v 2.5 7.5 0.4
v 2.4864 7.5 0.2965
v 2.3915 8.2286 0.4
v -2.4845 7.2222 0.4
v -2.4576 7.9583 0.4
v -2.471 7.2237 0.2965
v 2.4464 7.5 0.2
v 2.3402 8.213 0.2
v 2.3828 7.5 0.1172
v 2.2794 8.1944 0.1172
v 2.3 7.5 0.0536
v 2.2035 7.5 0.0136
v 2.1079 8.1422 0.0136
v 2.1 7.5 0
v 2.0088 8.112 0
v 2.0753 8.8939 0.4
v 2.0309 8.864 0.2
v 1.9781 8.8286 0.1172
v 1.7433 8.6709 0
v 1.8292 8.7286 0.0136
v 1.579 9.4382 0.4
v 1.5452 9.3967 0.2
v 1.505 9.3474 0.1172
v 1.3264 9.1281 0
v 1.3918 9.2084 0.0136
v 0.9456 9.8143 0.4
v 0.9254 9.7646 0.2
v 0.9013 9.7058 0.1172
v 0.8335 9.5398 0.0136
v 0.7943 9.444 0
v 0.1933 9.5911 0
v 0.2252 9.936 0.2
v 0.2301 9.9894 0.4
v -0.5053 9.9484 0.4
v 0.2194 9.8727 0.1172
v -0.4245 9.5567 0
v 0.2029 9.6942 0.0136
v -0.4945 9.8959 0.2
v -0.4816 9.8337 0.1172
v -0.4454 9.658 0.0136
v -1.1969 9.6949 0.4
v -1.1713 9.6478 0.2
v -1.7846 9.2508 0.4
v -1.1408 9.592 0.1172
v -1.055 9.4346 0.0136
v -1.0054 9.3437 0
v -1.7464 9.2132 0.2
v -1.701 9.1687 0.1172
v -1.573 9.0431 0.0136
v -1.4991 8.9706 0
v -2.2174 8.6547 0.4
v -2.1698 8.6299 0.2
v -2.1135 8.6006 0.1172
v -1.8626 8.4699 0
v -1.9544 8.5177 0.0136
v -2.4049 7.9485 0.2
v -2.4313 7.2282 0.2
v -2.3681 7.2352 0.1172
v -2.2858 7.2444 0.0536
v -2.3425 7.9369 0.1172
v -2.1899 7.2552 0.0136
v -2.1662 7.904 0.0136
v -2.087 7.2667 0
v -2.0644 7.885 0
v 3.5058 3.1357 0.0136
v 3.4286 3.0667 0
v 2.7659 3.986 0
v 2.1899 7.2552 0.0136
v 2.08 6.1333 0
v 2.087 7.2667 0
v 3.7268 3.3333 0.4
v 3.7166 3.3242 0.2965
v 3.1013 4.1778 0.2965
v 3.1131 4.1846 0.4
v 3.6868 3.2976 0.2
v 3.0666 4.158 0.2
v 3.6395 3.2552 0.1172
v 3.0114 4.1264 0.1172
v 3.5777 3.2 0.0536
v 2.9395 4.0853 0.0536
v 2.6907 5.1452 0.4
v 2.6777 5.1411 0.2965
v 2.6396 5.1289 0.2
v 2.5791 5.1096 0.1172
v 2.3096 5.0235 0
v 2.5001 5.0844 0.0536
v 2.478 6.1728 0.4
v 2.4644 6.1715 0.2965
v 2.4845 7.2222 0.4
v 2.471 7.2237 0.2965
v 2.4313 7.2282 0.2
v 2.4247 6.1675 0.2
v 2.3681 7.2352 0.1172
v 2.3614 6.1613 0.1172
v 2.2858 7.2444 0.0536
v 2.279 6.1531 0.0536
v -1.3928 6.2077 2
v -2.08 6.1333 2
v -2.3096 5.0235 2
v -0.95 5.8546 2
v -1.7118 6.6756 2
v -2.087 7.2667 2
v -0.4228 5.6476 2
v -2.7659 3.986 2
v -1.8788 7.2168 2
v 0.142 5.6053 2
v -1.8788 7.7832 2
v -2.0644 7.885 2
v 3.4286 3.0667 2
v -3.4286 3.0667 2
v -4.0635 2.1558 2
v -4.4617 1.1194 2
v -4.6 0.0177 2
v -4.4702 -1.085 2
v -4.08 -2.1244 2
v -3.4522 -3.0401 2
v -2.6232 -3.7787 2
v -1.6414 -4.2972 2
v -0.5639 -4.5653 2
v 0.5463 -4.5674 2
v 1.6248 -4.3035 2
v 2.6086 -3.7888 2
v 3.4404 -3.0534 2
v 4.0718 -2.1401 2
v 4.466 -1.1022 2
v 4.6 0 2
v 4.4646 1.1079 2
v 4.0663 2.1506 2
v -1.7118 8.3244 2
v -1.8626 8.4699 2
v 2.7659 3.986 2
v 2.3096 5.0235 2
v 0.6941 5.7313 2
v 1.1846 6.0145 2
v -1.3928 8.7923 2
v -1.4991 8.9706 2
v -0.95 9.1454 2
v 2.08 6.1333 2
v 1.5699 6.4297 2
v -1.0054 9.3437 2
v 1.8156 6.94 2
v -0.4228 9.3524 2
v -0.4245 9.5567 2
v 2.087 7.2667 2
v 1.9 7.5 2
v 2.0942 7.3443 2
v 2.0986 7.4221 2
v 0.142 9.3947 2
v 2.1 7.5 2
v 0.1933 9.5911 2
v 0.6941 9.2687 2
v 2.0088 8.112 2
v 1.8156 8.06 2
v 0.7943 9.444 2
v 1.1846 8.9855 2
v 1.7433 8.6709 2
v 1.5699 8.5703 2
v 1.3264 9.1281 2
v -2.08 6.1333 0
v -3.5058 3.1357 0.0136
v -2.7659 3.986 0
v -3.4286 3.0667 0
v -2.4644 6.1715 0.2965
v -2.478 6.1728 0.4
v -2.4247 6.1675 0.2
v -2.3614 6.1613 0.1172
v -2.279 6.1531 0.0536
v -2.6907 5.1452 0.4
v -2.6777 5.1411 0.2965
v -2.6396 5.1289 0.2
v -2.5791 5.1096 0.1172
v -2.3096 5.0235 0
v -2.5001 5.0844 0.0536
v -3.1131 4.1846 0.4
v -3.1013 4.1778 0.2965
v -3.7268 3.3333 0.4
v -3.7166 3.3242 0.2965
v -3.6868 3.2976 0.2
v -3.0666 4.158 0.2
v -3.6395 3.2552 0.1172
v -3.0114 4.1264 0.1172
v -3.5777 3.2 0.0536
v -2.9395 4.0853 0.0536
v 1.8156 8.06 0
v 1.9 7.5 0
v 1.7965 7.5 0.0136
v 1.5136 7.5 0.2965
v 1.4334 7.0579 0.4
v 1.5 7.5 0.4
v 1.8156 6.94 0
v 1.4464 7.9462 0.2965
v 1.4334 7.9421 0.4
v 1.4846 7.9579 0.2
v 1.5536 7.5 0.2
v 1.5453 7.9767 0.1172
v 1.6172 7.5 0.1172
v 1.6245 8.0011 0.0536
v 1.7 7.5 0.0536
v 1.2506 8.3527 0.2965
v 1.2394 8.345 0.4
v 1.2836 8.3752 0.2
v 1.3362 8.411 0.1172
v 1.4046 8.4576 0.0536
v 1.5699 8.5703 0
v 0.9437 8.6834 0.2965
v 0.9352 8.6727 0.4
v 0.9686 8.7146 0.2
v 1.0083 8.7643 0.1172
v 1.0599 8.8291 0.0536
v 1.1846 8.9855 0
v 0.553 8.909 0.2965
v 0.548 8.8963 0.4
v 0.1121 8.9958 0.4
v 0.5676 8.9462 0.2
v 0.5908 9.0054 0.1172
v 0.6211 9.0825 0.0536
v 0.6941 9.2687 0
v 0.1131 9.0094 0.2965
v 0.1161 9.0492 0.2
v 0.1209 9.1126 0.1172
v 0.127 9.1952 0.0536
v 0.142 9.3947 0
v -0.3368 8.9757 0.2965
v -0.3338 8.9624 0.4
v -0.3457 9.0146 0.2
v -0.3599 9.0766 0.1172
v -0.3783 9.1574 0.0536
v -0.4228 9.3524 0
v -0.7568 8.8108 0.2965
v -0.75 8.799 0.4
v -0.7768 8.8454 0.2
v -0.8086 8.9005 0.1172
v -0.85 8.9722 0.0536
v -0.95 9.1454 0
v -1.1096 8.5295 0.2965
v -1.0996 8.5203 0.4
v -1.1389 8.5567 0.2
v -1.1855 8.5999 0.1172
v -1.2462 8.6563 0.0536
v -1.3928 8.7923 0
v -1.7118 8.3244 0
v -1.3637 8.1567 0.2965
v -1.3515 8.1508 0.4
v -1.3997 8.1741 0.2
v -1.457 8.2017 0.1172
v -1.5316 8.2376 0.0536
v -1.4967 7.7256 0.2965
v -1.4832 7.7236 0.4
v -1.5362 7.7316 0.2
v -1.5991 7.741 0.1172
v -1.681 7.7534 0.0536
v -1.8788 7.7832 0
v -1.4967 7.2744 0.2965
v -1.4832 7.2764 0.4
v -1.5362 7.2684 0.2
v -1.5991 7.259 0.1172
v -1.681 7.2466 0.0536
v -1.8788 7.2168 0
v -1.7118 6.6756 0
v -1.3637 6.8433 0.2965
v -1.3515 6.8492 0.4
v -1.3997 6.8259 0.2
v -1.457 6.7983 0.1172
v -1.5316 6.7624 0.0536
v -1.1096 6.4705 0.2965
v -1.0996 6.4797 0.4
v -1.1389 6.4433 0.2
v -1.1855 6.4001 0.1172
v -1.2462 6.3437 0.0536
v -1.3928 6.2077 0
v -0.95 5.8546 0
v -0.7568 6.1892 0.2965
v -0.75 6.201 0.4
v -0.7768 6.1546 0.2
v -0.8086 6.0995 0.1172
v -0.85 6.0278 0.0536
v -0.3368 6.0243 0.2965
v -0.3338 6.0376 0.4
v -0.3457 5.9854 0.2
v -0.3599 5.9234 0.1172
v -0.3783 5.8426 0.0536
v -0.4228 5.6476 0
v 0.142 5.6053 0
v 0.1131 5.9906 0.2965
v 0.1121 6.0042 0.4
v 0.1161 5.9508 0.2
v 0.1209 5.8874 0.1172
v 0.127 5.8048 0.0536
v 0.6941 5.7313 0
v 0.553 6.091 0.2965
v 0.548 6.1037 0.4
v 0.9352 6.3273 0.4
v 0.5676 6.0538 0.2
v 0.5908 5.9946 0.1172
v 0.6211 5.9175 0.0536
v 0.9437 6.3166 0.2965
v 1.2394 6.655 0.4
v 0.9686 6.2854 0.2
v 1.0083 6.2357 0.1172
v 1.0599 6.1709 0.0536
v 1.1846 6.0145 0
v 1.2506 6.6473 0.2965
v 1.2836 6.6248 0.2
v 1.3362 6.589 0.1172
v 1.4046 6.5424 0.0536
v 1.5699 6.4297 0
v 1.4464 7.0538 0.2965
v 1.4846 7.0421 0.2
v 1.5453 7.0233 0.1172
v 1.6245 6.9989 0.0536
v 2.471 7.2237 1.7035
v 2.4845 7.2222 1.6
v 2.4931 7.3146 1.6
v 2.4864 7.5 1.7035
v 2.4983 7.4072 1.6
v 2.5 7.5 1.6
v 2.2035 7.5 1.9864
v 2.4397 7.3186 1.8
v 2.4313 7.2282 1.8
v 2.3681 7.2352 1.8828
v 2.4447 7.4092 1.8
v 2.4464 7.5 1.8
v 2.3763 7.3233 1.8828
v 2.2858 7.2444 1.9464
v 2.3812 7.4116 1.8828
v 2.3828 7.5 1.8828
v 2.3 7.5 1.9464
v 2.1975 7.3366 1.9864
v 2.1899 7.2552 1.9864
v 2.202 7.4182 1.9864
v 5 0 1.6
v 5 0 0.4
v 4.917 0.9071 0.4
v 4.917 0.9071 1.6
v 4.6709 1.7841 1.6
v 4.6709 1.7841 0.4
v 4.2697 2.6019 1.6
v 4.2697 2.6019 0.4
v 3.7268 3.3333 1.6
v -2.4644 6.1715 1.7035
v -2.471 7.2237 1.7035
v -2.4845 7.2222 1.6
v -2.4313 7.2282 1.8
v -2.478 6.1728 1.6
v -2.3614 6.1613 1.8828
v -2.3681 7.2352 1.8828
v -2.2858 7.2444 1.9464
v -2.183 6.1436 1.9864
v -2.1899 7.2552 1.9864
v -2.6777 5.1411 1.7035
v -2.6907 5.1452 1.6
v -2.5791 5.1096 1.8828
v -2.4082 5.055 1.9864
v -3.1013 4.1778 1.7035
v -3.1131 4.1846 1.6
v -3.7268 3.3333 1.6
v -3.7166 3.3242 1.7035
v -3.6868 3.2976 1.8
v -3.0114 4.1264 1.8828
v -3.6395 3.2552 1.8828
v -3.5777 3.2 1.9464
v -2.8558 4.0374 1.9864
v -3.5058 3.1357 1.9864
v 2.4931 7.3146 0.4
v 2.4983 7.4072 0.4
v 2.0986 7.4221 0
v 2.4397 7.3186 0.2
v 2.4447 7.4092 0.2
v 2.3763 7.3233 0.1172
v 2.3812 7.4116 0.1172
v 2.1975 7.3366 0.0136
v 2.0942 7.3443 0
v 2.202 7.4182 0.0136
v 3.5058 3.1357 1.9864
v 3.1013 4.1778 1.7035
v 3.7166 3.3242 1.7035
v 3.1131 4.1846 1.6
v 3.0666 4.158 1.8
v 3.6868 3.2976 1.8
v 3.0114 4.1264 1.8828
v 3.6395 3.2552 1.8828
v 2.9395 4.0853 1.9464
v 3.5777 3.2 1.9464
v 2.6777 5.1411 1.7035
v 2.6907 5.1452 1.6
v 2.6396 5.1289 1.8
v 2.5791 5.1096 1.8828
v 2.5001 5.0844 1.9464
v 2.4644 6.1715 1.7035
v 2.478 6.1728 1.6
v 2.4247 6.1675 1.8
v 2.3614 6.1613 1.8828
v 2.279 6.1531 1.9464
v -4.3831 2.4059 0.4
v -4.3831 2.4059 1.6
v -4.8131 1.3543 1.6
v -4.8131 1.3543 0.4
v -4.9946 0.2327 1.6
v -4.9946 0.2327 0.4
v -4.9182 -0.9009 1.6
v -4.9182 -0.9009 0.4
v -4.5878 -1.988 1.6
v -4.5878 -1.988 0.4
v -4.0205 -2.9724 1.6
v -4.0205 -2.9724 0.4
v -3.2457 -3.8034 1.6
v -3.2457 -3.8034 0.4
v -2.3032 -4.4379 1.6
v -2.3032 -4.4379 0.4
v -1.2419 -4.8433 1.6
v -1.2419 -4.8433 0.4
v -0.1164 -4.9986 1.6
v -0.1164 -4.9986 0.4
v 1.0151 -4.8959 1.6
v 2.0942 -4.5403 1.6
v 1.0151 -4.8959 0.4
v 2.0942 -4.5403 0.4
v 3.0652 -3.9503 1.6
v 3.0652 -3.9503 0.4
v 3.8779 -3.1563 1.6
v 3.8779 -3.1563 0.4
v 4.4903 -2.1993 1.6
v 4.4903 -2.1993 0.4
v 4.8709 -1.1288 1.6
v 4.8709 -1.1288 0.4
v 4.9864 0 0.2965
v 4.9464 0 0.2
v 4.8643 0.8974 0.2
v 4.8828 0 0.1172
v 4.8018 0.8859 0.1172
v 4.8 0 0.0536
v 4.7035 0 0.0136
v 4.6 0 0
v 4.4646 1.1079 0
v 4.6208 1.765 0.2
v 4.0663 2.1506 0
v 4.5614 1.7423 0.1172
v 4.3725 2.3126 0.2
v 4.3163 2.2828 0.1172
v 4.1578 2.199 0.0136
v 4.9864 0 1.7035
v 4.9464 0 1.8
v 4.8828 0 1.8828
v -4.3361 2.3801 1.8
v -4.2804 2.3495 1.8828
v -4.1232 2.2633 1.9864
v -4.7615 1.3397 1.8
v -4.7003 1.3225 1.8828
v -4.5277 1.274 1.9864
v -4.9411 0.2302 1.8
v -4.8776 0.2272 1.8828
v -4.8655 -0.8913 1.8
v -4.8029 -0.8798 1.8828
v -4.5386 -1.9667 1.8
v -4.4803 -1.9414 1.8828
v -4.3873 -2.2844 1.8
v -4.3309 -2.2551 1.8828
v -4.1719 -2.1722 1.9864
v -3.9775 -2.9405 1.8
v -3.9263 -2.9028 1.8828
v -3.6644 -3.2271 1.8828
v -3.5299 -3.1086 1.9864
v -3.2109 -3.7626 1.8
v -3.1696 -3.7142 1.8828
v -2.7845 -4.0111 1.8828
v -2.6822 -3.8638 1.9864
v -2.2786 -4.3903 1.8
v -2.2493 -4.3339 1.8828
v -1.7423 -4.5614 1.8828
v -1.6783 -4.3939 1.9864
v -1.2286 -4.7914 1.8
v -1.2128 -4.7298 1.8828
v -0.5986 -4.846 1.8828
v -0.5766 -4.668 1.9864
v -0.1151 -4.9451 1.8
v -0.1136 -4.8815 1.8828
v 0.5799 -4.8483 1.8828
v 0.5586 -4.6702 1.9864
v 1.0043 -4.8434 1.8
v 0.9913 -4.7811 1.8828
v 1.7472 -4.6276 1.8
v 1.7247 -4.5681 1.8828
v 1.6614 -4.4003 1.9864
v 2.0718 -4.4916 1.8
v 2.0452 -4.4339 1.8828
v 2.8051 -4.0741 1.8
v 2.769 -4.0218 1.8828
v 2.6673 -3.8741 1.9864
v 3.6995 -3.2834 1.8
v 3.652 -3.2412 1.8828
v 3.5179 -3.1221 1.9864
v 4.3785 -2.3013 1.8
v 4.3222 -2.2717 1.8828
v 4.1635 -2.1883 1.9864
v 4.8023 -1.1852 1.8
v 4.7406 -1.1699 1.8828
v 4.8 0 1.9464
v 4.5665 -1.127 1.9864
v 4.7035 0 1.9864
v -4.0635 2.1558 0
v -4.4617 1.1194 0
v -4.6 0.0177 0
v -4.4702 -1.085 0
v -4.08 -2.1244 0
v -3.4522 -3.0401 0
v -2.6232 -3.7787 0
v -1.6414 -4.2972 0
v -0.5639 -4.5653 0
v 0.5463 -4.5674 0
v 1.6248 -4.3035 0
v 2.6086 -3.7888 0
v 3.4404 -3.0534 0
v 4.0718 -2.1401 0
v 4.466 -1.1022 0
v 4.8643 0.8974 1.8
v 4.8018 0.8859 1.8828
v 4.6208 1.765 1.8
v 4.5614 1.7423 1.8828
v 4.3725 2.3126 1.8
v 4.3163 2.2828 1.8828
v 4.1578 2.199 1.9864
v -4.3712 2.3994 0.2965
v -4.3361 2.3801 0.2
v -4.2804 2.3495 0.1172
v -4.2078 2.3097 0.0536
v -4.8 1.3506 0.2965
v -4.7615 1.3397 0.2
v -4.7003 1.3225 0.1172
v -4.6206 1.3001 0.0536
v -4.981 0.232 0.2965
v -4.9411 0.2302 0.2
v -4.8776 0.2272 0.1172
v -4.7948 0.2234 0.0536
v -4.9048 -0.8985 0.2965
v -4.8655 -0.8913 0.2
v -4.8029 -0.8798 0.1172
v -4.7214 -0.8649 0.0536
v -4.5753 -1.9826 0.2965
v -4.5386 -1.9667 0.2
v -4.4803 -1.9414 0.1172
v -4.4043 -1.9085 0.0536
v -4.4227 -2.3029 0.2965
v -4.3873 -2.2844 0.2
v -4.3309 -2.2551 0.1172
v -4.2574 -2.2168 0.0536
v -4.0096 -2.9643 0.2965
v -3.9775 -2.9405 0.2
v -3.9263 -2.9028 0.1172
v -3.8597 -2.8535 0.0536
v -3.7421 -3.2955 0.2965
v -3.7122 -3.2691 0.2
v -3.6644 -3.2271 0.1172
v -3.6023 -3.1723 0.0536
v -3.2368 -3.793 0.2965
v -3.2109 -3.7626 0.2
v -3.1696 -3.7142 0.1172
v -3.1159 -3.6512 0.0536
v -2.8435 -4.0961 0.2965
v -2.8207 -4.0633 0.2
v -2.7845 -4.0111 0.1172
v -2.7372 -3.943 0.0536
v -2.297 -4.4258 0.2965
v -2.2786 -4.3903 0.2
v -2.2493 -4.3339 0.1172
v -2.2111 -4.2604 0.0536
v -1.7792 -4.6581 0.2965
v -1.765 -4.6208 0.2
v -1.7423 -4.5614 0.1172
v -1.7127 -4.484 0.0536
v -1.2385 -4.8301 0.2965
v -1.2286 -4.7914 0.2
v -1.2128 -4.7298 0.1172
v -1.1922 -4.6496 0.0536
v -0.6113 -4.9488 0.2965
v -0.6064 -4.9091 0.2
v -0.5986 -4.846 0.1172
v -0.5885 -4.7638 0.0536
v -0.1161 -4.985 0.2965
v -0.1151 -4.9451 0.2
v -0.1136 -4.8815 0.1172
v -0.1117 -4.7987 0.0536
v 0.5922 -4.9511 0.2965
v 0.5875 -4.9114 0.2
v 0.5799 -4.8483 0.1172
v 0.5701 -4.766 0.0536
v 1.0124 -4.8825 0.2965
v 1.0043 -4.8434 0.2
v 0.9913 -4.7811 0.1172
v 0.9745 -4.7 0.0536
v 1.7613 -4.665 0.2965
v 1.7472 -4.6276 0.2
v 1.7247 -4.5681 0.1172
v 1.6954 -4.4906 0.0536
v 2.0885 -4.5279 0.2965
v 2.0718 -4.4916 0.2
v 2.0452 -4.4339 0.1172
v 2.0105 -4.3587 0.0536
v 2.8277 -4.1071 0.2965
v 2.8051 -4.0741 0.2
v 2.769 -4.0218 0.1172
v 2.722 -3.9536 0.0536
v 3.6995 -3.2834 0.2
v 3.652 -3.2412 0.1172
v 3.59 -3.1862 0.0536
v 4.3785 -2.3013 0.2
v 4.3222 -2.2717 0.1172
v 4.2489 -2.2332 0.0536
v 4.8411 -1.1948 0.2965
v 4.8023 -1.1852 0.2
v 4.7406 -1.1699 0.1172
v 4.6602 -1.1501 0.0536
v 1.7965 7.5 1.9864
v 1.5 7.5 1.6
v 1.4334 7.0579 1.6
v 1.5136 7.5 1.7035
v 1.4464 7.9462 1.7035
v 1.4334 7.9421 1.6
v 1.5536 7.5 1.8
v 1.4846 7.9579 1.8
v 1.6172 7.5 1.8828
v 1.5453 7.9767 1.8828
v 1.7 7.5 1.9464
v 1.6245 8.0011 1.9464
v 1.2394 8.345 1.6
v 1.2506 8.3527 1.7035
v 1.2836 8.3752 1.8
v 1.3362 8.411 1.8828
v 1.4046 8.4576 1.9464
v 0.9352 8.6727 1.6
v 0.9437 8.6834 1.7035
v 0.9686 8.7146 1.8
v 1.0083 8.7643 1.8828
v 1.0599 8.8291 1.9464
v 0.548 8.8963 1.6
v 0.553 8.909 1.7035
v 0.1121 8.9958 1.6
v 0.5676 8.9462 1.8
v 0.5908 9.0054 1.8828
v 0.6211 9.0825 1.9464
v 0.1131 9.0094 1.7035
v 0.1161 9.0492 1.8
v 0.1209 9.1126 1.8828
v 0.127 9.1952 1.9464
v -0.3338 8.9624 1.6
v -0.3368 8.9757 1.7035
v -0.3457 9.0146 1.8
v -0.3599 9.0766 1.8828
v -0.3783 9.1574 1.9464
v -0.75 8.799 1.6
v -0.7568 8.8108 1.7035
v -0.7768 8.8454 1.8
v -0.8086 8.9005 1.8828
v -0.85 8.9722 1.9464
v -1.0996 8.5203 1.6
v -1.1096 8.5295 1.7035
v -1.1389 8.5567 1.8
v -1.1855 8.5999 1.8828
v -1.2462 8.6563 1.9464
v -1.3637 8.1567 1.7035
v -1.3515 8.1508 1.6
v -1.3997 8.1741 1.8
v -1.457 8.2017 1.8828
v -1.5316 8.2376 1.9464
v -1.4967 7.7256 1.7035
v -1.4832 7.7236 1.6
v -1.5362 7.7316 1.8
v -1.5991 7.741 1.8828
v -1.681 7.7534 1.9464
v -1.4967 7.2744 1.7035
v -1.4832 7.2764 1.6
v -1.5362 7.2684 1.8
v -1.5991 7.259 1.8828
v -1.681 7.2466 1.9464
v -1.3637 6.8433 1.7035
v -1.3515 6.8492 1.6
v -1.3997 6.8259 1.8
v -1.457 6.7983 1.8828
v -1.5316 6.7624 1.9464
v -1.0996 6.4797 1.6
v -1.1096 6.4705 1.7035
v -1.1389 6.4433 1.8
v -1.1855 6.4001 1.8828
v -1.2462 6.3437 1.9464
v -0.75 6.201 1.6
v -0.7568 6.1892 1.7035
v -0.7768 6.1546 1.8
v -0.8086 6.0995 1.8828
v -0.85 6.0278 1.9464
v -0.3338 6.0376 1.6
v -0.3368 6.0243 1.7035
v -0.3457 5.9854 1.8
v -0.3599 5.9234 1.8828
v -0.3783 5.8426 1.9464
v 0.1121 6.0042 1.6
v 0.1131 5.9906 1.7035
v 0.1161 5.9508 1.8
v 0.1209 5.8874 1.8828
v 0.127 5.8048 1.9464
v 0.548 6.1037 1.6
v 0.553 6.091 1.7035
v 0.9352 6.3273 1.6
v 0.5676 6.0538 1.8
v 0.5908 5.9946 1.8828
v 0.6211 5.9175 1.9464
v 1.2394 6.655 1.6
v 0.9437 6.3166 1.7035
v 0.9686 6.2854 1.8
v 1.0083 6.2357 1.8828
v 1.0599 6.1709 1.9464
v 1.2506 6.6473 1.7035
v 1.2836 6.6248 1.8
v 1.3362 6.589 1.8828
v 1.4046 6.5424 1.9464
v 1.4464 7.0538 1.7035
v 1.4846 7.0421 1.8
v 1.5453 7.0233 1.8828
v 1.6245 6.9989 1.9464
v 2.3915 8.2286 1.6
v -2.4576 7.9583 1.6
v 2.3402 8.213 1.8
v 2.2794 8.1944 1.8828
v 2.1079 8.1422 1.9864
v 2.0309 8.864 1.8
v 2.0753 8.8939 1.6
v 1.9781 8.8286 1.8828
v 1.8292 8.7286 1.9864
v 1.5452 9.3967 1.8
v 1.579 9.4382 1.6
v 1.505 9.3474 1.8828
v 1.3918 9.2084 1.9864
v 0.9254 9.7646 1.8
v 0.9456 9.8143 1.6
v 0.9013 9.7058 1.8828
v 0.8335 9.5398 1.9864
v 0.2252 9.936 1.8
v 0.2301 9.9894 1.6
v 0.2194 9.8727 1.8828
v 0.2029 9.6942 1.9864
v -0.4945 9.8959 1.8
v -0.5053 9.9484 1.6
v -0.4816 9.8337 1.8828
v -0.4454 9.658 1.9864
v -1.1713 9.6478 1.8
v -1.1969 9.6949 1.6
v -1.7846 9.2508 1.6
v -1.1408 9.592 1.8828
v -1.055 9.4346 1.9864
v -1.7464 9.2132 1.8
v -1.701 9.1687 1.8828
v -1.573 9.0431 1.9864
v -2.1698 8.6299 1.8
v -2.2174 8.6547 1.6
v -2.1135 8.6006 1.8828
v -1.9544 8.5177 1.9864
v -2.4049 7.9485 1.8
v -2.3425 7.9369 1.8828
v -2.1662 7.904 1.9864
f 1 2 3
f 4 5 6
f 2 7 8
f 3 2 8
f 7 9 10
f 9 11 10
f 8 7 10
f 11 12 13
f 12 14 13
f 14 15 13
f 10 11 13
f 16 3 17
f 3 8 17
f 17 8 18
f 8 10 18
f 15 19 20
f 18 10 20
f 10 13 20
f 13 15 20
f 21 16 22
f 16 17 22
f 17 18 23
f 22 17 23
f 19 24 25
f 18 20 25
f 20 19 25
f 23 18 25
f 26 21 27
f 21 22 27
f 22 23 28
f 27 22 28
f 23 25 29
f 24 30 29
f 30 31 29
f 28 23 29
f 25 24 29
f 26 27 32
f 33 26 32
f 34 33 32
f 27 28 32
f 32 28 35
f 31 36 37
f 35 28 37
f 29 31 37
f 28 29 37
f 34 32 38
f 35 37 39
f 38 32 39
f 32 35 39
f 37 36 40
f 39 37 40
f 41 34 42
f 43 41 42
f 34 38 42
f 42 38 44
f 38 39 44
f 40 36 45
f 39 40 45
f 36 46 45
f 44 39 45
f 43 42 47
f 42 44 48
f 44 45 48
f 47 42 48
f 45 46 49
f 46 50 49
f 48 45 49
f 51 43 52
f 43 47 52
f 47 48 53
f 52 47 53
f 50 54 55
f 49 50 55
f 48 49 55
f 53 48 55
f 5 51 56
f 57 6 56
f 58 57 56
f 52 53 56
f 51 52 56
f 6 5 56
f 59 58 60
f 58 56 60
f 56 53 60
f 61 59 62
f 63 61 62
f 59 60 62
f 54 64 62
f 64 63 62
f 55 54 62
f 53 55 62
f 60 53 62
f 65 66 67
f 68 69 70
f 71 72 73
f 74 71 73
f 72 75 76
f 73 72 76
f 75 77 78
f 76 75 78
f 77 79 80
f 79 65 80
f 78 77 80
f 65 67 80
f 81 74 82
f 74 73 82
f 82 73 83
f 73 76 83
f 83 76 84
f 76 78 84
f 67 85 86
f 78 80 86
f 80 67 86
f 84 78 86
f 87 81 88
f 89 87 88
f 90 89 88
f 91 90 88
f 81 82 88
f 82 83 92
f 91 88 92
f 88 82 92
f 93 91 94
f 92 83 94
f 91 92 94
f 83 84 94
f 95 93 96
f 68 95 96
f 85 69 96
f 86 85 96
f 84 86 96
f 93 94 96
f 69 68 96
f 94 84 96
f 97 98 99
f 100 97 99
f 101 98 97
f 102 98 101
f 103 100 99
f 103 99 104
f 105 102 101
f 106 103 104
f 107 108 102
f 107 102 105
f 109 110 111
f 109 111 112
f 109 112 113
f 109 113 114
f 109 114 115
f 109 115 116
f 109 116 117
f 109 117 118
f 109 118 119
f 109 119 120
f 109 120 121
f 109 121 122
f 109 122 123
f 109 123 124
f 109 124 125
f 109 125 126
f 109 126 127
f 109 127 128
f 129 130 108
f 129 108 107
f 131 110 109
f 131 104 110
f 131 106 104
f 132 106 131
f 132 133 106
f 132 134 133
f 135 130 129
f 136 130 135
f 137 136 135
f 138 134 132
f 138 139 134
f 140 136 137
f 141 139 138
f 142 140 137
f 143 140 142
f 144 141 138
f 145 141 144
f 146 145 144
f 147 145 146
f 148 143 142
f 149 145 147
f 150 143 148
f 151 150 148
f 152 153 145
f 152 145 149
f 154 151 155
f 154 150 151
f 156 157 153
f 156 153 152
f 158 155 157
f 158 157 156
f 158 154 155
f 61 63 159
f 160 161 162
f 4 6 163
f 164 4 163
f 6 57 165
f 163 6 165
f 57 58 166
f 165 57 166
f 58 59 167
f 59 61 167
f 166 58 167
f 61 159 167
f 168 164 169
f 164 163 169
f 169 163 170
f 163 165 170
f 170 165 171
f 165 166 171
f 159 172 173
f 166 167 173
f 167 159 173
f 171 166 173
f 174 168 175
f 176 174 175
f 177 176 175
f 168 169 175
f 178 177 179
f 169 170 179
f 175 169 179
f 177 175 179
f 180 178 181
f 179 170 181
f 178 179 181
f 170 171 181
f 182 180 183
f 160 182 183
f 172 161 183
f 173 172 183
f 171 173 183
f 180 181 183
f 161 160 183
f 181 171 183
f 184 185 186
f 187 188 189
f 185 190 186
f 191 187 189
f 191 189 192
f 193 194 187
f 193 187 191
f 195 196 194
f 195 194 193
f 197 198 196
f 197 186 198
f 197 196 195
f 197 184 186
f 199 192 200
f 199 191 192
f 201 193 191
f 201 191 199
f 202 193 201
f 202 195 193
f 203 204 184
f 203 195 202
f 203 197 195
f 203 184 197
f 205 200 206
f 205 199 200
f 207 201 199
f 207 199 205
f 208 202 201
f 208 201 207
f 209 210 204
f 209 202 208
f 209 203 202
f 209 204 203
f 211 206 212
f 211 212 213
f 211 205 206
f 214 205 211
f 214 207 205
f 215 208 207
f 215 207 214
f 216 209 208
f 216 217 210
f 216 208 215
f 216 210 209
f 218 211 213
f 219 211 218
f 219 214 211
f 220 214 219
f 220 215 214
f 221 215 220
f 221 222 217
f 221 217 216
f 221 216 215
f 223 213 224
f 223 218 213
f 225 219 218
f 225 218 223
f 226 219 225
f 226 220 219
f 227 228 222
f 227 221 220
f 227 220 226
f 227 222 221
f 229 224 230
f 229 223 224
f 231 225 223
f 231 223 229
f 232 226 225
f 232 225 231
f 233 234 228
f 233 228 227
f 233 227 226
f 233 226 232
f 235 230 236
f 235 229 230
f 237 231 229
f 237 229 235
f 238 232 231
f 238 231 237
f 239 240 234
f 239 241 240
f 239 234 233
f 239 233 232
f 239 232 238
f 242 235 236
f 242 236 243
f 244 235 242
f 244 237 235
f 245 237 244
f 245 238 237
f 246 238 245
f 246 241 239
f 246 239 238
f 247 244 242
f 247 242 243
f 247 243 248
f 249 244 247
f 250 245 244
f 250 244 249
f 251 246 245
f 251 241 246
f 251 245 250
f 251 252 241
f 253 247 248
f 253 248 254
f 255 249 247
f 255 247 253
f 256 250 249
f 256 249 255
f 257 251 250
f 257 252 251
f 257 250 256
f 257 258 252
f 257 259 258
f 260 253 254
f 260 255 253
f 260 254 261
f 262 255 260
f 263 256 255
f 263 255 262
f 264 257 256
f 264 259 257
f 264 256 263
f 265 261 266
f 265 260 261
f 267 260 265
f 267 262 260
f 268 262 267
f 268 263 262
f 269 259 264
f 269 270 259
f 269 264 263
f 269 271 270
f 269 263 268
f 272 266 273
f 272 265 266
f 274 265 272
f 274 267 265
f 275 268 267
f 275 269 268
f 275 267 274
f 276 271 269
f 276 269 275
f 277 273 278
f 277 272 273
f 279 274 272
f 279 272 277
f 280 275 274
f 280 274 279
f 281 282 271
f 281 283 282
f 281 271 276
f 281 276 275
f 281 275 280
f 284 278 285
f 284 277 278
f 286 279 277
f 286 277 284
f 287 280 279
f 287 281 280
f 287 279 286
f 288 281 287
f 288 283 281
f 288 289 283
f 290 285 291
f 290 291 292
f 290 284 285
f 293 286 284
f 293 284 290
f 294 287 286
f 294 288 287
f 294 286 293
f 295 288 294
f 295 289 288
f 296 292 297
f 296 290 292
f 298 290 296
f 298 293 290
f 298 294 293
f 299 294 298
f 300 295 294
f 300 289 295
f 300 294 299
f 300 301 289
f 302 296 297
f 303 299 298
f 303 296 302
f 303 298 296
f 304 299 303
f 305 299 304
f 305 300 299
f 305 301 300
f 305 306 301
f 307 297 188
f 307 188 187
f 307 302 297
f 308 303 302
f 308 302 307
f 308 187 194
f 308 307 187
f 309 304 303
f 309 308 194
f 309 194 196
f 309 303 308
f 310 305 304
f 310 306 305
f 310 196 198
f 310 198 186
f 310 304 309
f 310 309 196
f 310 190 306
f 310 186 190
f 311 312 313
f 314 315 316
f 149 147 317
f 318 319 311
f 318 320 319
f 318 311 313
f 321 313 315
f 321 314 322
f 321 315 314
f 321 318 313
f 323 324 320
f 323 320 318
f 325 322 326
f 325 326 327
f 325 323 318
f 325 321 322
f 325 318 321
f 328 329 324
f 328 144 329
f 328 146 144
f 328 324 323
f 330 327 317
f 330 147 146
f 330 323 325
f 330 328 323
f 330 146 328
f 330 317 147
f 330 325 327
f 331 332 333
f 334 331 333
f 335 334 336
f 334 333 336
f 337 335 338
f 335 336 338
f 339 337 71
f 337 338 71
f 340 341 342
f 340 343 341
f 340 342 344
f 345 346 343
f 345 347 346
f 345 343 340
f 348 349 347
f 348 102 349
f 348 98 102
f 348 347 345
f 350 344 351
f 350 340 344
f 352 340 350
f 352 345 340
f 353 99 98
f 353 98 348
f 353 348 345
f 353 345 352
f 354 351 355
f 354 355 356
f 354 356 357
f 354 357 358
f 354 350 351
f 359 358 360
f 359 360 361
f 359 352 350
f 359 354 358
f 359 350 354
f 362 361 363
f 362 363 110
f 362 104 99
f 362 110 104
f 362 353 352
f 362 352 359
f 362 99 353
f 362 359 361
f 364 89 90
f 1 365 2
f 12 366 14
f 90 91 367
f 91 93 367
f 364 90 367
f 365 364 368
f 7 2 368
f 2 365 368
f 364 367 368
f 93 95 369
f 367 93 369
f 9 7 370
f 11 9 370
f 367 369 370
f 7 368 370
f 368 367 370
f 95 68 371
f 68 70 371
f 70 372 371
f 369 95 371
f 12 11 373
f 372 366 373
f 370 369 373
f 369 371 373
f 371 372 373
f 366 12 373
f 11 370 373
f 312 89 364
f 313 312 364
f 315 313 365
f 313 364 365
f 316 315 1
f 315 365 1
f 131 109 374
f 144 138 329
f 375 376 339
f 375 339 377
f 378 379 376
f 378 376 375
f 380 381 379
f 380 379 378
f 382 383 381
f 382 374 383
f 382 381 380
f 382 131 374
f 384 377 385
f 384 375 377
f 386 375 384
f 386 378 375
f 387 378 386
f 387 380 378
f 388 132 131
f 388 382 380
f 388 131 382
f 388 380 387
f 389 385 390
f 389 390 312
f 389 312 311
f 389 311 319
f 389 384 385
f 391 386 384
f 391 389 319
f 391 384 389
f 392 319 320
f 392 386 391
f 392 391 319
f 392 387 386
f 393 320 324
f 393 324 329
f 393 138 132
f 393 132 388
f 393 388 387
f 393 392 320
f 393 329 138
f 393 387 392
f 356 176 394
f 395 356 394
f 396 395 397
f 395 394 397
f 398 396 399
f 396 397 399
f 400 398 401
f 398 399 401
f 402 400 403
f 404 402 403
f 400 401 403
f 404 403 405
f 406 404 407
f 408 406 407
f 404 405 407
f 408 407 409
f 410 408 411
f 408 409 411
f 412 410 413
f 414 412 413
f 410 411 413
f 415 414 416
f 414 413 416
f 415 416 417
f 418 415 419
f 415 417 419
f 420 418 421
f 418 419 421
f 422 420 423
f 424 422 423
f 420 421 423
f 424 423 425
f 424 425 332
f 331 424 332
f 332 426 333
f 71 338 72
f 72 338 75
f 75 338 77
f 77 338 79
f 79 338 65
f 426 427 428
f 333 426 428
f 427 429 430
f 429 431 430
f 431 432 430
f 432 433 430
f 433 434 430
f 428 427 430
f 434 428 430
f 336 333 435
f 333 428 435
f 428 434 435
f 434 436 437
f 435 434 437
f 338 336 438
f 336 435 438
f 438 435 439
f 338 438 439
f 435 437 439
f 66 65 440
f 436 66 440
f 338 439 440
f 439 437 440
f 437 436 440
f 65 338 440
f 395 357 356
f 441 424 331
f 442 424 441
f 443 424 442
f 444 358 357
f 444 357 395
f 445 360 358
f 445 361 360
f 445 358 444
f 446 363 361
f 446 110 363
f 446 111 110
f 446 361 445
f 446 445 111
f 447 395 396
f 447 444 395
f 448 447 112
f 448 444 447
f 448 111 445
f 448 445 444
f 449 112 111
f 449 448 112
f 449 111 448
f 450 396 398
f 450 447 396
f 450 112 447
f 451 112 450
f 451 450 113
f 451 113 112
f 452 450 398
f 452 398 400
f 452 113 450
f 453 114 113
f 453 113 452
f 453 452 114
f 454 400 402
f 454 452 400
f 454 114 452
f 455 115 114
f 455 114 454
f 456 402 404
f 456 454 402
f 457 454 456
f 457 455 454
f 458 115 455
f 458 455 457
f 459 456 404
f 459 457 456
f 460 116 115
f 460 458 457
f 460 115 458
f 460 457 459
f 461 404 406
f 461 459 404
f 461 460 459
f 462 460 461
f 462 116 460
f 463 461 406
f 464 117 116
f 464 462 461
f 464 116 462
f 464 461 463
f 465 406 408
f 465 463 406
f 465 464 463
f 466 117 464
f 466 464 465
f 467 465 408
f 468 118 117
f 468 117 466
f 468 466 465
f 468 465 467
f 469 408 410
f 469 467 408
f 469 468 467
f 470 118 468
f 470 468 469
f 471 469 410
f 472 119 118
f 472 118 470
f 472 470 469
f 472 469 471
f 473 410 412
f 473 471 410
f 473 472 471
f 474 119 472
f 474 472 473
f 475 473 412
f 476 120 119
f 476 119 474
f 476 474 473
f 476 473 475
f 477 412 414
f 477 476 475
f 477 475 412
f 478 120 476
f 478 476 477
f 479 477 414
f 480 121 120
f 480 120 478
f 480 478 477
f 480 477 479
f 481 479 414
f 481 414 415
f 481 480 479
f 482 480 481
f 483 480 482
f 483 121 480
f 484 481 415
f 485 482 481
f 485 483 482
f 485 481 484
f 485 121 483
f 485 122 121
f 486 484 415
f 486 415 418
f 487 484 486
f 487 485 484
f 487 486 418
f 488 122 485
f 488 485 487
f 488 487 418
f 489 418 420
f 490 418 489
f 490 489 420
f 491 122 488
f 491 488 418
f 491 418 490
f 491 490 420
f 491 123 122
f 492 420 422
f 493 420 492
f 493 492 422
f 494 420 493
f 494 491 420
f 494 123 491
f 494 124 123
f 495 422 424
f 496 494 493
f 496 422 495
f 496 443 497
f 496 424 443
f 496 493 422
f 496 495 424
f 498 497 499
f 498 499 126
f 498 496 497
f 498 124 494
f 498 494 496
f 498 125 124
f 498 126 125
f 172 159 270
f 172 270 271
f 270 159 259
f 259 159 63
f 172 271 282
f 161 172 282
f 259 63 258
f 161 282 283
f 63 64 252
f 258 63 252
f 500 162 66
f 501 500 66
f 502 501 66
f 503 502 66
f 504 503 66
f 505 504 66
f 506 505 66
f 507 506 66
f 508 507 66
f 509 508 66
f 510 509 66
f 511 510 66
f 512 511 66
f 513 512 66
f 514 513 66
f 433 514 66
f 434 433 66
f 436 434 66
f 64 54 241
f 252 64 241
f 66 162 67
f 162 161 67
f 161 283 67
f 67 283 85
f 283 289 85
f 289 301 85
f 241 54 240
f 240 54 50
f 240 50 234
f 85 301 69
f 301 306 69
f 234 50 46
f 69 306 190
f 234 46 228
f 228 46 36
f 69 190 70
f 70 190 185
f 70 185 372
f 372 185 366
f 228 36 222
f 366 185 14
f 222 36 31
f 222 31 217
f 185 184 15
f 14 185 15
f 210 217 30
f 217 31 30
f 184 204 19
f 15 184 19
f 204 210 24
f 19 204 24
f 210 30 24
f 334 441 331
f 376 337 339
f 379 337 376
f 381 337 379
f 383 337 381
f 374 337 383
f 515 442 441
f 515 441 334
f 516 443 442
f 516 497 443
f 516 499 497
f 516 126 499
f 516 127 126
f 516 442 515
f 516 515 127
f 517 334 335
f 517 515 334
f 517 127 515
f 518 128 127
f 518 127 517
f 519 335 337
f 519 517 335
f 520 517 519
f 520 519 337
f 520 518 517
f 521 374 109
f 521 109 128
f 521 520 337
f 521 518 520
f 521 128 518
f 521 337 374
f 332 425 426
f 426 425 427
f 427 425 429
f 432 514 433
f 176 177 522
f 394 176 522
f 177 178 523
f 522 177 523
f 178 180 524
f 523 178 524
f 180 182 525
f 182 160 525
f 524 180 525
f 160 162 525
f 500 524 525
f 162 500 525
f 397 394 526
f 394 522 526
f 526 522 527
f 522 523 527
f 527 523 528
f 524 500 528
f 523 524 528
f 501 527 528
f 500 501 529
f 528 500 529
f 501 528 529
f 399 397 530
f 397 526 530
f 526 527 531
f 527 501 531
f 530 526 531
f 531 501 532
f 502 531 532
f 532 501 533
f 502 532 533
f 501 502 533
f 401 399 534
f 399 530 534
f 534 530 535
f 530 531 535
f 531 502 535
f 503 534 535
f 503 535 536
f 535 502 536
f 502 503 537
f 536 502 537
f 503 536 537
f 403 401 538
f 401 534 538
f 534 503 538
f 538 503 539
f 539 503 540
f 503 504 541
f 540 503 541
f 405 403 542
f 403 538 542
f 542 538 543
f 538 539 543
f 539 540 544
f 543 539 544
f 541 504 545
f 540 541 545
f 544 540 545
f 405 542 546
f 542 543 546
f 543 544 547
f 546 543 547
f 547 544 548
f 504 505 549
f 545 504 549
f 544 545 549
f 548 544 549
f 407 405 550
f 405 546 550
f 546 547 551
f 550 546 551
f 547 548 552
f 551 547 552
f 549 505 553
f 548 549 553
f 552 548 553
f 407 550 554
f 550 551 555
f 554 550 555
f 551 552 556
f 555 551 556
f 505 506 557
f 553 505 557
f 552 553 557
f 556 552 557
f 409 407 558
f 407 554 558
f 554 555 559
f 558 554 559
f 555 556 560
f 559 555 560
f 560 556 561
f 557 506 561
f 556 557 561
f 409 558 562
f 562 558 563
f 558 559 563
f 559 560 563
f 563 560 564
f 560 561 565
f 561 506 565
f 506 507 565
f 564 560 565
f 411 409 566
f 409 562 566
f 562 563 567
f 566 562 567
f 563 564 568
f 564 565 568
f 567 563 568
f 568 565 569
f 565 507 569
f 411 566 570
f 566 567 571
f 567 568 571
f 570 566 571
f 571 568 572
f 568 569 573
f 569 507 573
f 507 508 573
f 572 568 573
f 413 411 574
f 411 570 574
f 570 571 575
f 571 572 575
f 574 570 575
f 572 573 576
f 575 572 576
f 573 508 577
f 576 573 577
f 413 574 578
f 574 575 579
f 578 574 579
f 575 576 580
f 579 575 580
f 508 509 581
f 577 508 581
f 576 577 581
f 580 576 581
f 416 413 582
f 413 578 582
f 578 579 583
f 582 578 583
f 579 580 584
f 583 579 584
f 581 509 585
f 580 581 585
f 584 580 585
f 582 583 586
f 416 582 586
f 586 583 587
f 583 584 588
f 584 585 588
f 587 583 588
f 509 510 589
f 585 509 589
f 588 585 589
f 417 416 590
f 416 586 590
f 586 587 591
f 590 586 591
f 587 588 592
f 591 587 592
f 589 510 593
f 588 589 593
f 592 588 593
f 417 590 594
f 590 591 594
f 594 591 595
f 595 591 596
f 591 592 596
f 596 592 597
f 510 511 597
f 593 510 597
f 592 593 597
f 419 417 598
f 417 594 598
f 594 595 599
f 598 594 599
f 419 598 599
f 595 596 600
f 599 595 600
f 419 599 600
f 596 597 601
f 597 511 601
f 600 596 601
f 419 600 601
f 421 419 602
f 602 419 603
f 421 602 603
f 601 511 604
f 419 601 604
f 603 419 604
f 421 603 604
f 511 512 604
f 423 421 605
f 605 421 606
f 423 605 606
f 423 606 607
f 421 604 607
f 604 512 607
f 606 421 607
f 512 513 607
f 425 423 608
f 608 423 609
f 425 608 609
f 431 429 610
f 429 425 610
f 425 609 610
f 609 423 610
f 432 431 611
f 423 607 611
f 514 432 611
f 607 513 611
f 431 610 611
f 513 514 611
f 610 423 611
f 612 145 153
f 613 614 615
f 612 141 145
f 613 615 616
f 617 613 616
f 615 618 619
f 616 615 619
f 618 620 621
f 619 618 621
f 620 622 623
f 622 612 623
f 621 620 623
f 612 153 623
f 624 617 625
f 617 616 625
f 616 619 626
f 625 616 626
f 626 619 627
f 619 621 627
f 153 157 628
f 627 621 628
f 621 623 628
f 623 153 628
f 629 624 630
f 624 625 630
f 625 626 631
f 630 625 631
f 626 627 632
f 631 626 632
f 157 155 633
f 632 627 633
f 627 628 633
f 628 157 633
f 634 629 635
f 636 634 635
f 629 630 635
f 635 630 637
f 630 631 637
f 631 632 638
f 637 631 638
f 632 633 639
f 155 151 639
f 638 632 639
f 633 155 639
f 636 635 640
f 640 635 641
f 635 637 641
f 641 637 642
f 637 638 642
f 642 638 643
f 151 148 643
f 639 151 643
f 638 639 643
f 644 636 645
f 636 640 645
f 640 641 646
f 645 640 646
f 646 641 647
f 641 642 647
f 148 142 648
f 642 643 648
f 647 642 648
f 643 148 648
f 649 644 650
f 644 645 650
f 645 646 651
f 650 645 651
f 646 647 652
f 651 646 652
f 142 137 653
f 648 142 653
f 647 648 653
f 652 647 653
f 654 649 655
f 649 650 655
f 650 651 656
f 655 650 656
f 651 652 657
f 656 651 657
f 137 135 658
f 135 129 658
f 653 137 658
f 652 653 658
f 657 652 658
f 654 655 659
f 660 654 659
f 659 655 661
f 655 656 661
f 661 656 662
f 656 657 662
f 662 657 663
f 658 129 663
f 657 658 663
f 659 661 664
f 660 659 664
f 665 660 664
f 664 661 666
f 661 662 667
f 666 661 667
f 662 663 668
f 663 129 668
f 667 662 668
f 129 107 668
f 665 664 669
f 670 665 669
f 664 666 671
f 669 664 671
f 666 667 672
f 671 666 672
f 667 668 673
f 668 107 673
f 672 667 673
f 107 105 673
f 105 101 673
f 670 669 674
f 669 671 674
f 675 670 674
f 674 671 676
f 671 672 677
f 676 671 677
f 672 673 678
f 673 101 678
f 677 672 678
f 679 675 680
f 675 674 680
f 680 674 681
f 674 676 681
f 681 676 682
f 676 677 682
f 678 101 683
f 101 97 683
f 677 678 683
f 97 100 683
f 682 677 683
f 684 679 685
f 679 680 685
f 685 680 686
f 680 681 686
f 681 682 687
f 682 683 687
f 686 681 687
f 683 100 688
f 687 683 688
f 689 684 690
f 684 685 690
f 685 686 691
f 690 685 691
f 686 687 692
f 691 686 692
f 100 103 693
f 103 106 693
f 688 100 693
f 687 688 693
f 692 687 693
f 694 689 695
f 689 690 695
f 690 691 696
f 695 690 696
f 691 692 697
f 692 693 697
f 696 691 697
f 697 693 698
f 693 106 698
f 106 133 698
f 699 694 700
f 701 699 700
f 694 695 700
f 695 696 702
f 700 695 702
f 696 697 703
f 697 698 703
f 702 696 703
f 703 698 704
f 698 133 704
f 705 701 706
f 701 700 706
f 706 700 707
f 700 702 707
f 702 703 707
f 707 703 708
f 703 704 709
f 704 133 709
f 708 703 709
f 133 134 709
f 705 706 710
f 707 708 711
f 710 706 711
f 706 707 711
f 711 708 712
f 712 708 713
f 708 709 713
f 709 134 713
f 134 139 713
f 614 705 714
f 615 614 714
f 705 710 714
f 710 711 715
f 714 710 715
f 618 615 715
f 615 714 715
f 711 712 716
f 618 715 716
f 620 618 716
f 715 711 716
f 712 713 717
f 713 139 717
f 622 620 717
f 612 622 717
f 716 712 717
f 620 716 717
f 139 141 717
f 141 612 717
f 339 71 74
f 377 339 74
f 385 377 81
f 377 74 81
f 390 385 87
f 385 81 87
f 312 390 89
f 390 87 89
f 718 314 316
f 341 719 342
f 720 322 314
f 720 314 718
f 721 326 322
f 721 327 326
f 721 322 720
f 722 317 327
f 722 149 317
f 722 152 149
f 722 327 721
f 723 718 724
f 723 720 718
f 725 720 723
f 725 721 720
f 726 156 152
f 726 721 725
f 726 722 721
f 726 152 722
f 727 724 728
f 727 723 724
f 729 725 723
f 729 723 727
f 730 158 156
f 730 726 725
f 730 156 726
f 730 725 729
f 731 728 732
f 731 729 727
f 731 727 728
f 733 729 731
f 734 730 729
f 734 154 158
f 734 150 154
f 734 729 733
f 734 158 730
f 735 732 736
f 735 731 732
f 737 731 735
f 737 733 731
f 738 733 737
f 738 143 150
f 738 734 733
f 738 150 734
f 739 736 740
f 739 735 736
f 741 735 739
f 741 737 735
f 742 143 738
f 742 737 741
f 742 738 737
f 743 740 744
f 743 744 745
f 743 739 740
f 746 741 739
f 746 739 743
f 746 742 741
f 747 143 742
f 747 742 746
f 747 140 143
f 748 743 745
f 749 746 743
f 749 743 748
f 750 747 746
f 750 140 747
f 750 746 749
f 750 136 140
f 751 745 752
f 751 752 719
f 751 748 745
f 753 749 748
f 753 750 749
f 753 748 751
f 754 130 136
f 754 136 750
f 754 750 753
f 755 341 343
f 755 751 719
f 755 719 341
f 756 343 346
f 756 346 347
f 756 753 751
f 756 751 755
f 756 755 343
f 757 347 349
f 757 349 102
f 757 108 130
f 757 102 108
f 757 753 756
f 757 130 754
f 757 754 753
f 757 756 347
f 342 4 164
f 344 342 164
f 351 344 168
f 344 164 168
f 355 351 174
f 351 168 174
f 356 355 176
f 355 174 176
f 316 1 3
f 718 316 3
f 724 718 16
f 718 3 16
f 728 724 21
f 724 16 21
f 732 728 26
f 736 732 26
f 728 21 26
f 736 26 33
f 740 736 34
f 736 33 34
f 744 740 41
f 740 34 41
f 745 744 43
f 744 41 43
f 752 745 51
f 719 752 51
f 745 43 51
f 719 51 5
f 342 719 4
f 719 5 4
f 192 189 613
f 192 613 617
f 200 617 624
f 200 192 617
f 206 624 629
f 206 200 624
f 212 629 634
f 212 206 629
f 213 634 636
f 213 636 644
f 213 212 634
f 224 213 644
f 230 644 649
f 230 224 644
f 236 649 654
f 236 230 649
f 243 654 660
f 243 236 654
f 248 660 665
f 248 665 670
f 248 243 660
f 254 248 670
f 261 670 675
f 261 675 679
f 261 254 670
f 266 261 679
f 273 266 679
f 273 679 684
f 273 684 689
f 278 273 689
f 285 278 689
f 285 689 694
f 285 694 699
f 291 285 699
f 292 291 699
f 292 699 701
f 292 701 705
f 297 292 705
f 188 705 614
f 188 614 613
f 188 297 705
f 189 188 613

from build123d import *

# Parameters (mm, degrees)
F0_R     = 1.5
F1_DEPTH = 2
F2_R     = 0.4


with BuildPart() as f1:
    # F0 (on Top) → F1 (new body)
    with BuildSketch(Plane.XY):
        with BuildLine():
            ThreePointArc((-3.72678, 3.333333), (-1.78411, -4.670862), (5, 0))
            ThreePointArc((5, 0), (4.670862, 1.78411), (3.72678, 3.333333))
            ThreePointArc((3.72678, 3.333333), (2.041241, 4.564355), (0, 5))
            ThreePointArc((0, 5), (-2.041241, 4.564355), (-3.72678, 3.333333))
        make_face()
        with BuildLine():
            ThreePointArc((0, 5), (2.041241, 4.564355), (3.72678, 3.333333))
            ThreePointArc((3.72678, 3.333333), (2.690663, 5.145215), (2.48452, 7.222222))
            ThreePointArc((2.48452, 7.222222), (1.666667, 5.63661), (0, 5))
        make_face()
        with BuildLine():
            ThreePointArc((-2.48452, 7.222222), (-2.690663, 5.145215), (-3.72678, 3.333333))
            ThreePointArc((-3.72678, 3.333333), (-2.041241, 4.564355), (0, 5))
            ThreePointArc((0, 5), (-1.666667, 5.63661), (-2.48452, 7.222222))
        make_face()
        with BuildLine():
            ThreePointArc((-2.48452, 7.222222), (-1.666667, 5.63661), (0, 5))
            ThreePointArc((0, 5), (1.666667, 5.63661), (2.48452, 7.222222))
            ThreePointArc((2.48452, 7.222222), (2.496127, 7.360896), (2.5, 7.5))
            ThreePointArc((2.5, 7.5), (-0.139104, 9.996127), (-2.48452, 7.222222))
        make_face()
        with Locations((0, 7.5)):
            Circle(F0_R, mode=Mode.SUBTRACT)
    extrude(amount=F1_DEPTH)

    # F2
    f2_edges = [f1.edges().sort_by_distance(p)[0] for p in [
        (4.670862, 1.78411, 0),
        (2.690663, 5.145215, 0),
        (0, 10, 0),
        (-2.690663, 5.145215, 0),
        (-1.78411, -4.670862, 0),
        (-1.5, 7.5, 0),
        (-1.78411, -4.670862, 2),
        (4.670862, 1.78411, 2),
        (2.690663, 5.145215, 2),
        (0, 10, 2),
        (-2.690663, 5.145215, 2),
        (-1.5, 7.5, 2),
    ]]
    fillet(f2_edges, radius=F2_R)


solid = f1.part
